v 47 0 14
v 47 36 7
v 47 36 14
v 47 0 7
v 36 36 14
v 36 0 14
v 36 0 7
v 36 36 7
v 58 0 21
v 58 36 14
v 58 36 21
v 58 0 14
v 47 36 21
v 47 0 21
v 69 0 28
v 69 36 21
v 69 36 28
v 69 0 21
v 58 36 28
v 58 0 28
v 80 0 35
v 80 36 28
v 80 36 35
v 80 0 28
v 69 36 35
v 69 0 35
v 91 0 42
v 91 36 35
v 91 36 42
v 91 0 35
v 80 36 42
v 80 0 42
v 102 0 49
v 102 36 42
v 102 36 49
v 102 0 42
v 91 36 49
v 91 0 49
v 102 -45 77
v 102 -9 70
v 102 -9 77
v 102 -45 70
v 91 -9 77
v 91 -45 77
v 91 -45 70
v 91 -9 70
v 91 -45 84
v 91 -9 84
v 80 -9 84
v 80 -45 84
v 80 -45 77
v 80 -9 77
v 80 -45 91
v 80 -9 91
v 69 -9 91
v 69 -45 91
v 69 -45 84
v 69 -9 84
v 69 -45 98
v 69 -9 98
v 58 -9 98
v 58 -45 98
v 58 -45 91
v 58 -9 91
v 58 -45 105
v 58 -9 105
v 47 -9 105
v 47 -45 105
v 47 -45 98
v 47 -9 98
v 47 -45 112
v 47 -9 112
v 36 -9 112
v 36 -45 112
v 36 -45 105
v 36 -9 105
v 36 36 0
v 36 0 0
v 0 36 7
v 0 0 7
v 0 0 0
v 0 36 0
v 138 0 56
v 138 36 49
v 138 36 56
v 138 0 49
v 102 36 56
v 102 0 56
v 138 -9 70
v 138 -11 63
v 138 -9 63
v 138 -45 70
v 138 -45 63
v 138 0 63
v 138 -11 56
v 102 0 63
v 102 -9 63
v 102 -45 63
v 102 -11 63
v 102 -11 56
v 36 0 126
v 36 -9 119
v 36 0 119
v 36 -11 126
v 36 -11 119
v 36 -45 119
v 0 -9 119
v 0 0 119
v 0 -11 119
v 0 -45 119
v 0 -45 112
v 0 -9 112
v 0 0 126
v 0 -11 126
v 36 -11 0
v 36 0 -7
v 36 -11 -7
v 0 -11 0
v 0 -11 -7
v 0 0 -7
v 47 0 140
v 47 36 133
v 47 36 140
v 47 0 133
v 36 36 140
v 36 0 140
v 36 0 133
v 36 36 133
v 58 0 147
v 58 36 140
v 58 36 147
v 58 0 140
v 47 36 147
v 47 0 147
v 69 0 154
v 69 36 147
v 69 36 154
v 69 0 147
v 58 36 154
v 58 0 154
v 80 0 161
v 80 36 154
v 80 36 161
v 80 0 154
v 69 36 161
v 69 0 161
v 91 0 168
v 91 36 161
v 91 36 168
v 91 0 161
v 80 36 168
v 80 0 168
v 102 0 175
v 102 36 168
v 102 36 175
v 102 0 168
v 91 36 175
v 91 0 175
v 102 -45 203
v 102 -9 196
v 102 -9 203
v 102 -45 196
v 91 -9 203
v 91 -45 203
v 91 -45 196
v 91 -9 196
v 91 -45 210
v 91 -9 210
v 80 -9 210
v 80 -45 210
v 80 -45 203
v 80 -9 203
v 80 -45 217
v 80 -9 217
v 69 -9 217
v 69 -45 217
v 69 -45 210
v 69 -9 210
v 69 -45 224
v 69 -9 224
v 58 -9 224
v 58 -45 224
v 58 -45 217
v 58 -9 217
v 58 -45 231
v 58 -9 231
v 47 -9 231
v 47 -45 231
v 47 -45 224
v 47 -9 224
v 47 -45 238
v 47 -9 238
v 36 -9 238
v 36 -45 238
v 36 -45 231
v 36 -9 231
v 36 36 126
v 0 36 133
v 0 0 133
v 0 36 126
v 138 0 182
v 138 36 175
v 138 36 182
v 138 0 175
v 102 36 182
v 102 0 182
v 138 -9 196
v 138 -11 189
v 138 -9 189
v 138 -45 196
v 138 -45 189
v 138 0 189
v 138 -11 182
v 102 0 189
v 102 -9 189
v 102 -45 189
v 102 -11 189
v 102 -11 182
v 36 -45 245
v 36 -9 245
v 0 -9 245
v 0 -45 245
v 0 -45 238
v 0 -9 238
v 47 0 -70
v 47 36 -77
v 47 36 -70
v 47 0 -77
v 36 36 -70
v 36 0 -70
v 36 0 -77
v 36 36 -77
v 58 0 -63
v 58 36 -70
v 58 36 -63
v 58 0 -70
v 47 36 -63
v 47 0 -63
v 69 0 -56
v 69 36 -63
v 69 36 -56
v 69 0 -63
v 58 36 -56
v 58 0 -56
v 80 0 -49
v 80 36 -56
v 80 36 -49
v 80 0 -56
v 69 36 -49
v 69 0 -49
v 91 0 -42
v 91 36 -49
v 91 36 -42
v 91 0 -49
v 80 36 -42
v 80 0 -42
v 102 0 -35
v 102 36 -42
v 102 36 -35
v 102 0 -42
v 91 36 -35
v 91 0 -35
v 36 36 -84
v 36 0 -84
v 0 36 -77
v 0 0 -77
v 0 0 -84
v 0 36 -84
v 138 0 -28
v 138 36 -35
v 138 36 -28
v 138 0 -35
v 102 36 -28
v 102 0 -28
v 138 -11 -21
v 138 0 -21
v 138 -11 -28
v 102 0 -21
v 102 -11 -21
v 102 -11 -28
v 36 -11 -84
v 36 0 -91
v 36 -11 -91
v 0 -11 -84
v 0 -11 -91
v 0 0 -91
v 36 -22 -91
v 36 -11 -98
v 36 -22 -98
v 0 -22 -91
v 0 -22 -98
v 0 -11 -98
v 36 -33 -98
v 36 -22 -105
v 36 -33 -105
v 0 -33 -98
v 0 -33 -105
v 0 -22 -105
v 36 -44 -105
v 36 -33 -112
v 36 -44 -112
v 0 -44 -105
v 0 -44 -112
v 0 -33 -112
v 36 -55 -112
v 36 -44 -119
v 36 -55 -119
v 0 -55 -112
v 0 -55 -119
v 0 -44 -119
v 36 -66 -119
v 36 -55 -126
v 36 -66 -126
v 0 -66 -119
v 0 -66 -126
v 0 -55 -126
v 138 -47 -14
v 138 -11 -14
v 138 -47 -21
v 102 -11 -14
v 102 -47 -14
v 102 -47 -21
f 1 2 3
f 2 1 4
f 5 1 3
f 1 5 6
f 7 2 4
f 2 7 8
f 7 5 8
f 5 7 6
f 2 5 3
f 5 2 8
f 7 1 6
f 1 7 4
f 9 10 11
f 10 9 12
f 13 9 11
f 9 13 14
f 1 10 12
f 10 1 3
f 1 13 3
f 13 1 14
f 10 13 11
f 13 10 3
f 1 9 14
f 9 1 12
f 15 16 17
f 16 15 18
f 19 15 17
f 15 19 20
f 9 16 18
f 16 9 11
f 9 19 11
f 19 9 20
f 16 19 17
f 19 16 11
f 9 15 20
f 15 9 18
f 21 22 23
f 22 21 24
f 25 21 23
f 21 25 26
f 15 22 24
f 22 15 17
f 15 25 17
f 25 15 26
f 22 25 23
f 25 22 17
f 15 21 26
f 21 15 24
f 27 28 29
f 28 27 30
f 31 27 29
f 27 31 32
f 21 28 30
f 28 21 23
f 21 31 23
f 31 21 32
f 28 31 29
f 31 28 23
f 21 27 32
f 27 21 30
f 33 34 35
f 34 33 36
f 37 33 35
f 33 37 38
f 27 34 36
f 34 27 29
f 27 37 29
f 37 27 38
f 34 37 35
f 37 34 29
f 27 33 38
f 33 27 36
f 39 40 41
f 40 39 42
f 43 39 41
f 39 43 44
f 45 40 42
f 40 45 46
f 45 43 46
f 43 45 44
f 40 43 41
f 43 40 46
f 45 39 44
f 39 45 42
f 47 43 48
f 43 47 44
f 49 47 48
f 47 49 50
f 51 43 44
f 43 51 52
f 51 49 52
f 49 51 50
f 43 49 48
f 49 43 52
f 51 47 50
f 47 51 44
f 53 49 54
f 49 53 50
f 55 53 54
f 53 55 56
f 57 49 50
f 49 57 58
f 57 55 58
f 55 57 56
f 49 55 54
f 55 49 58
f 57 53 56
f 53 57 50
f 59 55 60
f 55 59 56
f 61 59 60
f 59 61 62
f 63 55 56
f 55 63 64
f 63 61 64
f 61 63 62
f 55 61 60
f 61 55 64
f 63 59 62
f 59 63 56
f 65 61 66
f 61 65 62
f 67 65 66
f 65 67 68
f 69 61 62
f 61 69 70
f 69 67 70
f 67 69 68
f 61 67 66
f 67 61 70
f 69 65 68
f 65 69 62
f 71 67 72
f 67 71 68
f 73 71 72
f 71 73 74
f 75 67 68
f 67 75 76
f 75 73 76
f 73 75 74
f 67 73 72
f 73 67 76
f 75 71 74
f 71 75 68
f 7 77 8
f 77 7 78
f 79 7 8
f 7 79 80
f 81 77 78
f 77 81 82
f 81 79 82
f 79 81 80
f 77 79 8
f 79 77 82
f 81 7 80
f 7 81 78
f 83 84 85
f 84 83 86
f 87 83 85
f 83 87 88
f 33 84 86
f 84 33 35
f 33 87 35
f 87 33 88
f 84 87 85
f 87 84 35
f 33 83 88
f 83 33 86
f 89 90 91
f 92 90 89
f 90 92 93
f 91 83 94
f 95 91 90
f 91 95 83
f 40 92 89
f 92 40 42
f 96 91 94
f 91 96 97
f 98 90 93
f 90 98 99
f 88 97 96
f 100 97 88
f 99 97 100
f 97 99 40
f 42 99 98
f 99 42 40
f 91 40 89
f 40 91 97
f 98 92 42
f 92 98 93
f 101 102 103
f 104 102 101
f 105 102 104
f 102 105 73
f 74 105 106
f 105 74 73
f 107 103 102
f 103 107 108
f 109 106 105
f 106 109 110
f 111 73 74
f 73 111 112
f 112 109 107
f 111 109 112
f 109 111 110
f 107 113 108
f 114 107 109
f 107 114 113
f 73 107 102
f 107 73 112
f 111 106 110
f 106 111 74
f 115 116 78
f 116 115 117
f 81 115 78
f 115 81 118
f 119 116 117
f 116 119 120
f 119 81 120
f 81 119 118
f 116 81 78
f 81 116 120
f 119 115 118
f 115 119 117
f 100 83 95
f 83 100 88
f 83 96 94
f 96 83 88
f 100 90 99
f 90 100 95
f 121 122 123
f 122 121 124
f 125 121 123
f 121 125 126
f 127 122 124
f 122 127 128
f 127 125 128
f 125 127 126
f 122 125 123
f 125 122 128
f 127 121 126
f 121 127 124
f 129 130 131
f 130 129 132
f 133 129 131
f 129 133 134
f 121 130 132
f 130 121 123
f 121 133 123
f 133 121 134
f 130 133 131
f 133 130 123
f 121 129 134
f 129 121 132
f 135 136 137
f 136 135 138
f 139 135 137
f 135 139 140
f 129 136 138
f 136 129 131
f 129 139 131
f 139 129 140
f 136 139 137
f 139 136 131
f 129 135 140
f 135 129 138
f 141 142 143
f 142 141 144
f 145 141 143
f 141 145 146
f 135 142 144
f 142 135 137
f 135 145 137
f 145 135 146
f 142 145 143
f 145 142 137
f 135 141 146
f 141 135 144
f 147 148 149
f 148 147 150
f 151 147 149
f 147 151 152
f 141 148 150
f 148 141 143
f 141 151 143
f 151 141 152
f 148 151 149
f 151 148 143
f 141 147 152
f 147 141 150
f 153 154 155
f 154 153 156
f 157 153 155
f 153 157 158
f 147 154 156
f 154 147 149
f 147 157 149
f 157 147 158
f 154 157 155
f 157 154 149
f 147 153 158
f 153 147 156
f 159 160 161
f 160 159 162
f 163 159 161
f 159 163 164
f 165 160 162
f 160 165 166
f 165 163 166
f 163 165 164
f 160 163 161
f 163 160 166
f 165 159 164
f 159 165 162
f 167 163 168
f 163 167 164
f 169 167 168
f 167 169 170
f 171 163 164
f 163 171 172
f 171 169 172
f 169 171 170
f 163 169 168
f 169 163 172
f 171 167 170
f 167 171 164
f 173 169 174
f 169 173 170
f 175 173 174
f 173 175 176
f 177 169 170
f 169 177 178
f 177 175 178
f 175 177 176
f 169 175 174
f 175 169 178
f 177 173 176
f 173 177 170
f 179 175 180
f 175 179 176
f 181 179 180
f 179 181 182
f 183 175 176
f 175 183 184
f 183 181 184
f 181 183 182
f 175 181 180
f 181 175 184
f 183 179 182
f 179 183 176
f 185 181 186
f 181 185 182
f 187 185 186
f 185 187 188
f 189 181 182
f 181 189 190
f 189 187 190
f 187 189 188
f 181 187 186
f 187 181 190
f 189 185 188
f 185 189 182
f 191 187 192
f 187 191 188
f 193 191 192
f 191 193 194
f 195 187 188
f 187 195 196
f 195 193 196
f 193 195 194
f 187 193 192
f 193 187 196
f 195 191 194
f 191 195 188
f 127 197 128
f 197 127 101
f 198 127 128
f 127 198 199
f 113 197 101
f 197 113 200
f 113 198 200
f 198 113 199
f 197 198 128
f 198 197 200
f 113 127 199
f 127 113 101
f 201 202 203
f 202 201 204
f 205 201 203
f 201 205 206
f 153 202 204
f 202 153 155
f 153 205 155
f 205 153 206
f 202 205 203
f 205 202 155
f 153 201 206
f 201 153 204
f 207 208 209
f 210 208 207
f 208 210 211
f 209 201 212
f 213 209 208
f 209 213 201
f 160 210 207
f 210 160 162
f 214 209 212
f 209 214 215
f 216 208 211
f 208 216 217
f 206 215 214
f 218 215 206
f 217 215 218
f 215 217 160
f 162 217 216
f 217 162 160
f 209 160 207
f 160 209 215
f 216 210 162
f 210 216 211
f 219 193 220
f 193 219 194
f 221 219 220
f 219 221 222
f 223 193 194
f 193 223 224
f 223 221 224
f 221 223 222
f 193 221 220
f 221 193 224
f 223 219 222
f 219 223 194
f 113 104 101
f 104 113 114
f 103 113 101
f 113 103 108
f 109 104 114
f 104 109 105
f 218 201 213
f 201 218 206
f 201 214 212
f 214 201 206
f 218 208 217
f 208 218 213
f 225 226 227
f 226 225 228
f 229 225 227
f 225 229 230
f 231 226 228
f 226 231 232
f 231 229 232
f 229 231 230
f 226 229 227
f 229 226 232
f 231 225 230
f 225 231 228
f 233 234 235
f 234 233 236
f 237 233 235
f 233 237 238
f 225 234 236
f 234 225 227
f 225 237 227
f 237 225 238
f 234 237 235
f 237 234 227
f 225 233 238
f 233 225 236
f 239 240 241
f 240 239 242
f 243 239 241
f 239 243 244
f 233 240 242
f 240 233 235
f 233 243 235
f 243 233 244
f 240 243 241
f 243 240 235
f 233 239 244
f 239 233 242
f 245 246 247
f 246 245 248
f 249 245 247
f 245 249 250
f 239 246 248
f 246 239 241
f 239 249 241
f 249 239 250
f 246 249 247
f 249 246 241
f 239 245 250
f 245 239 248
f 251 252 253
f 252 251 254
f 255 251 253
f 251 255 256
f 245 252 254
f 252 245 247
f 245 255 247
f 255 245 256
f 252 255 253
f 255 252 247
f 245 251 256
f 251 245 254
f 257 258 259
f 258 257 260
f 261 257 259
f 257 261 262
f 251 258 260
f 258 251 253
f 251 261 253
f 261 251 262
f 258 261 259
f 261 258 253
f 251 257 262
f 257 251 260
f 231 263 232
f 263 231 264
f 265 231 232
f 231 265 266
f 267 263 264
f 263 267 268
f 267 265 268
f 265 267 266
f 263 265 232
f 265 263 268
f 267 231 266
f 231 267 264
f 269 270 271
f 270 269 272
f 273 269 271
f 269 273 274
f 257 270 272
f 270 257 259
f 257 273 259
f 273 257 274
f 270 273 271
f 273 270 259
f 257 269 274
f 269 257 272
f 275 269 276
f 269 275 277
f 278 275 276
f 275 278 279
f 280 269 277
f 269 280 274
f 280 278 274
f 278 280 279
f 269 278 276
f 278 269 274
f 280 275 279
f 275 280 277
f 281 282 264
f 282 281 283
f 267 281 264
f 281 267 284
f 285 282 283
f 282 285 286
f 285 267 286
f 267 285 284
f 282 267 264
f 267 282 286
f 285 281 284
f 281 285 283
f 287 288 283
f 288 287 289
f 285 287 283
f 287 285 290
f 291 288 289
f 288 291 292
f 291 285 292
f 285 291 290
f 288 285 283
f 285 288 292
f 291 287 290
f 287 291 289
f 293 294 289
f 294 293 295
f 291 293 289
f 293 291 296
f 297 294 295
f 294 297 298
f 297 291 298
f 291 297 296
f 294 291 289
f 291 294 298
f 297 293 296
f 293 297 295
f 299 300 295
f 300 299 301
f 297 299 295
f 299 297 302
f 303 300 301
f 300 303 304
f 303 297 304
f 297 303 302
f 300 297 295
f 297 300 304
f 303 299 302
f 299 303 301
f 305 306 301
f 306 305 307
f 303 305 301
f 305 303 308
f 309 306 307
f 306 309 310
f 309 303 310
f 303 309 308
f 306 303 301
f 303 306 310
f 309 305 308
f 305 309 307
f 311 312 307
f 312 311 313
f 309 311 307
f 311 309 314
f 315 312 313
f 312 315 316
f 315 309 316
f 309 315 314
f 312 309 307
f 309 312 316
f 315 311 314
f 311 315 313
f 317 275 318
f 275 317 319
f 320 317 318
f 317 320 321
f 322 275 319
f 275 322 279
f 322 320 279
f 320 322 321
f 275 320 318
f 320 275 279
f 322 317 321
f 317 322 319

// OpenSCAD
module stairs_up() {
    cube([36,36,7]);
f1 = 36;
f3 = 7;

for(i=[0:5]) {
    x = f1 + i * 11;
    z = f3 + i * 7;
    translate([x,0,z]) {
        cube([11,36,7]);
    }
    
}
translate([102, 0, 49]) {
    cube([36,36,7]);
}

translate([102, -11, 56]) {
cube([36,11,7]);
}
}

module ground_floor() {
cube([36,36,7]);
f1 = 36;
f3 = 7;

for(i=[0:5]) {
    x = f1 + i * 11;
    z = f3 + i * 7;
    translate([x,0,z]) {
        cube([11,36,7]);
    }
    
}
translate([102, 0, 49]) {
    cube([36,36,7]);
}

translate([102, -45, 63]) {
    cube([36,36,7]);
}

f4 = 91;
f6 = 70;
for(i=[0:5]) {
    p = f4 - i * 11;
    q = f6 + i * 7;
    translate([p, -45, q]) {
        cube([11, 36, 7]);
    }
}

translate([0, -45, 112]) {
    cube([36,36,7]);
}

translate([0, -11, -7]) {
cube([36,11,7]);
}

translate([102, -11, 56]) {
cube([36,11,7]);
}

}

module ground_walls() {
    //side - wall 
rotate([90,0,0]) {
 translate([0, -126, -36]) {
    color("lightgrey", 0.7) square([138,370]);
 }
}

rotate([90,0,90]) {
 translate([-207, -126, 0]) {
    //color("lightgrey", 0.5) square([243,370]);
 }
}
//ground - ceiling
translate([0, -207, 119]) {
    //color("lightblue", 0.3) square([138, 160]);
}
//ground - floor
translate([0, -207, -7]) {
    //color("lightblue", 0.3) square([102, 207]);
}
translate([0, -207, -7]) {
    color("lightblue", 0.3) square([138, 157]);
}
//first - ceiling
translate([0, -207, 245]) {
    //color("lightblue", 0.3) square([138, 160]);
}

//base - floor
translate([0, -207, -126]) {
    color("lightblue", 0.3) square([138, 160]);
}
}

module sample() {
    cube([36,36,7]);
}

module translate_ground() {
    translate([0, 0, 126]) {
        color("blue") ground_floor();
    }
}

module translate_stairs_up() {
    translate([0, 0, -84]) {
        color("lightgreen") stairs_up();
    }
    m = 11; 
    n = 91;
    for(i=[0:5]) {
        p = -(m + i * 11);
        q = -(n + i * 7);
        translate([0, p, q]) {
            color("lightgreen") cube([36,11,7]);
        }
    }
}

module body() {
    translate([100,-50,-14]) {
        //color("red", 0.8) cube([24, 12, 72]);
    }
}

module ground_stair_clearance() {
    translate([102, -47, -21]) {
     color("lightgreen") cube([36,36,7]);
    }    
}
body();
ground_floor();
ground_walls();
translate_ground();
translate_stairs_up();
ground_stair_clearance();
